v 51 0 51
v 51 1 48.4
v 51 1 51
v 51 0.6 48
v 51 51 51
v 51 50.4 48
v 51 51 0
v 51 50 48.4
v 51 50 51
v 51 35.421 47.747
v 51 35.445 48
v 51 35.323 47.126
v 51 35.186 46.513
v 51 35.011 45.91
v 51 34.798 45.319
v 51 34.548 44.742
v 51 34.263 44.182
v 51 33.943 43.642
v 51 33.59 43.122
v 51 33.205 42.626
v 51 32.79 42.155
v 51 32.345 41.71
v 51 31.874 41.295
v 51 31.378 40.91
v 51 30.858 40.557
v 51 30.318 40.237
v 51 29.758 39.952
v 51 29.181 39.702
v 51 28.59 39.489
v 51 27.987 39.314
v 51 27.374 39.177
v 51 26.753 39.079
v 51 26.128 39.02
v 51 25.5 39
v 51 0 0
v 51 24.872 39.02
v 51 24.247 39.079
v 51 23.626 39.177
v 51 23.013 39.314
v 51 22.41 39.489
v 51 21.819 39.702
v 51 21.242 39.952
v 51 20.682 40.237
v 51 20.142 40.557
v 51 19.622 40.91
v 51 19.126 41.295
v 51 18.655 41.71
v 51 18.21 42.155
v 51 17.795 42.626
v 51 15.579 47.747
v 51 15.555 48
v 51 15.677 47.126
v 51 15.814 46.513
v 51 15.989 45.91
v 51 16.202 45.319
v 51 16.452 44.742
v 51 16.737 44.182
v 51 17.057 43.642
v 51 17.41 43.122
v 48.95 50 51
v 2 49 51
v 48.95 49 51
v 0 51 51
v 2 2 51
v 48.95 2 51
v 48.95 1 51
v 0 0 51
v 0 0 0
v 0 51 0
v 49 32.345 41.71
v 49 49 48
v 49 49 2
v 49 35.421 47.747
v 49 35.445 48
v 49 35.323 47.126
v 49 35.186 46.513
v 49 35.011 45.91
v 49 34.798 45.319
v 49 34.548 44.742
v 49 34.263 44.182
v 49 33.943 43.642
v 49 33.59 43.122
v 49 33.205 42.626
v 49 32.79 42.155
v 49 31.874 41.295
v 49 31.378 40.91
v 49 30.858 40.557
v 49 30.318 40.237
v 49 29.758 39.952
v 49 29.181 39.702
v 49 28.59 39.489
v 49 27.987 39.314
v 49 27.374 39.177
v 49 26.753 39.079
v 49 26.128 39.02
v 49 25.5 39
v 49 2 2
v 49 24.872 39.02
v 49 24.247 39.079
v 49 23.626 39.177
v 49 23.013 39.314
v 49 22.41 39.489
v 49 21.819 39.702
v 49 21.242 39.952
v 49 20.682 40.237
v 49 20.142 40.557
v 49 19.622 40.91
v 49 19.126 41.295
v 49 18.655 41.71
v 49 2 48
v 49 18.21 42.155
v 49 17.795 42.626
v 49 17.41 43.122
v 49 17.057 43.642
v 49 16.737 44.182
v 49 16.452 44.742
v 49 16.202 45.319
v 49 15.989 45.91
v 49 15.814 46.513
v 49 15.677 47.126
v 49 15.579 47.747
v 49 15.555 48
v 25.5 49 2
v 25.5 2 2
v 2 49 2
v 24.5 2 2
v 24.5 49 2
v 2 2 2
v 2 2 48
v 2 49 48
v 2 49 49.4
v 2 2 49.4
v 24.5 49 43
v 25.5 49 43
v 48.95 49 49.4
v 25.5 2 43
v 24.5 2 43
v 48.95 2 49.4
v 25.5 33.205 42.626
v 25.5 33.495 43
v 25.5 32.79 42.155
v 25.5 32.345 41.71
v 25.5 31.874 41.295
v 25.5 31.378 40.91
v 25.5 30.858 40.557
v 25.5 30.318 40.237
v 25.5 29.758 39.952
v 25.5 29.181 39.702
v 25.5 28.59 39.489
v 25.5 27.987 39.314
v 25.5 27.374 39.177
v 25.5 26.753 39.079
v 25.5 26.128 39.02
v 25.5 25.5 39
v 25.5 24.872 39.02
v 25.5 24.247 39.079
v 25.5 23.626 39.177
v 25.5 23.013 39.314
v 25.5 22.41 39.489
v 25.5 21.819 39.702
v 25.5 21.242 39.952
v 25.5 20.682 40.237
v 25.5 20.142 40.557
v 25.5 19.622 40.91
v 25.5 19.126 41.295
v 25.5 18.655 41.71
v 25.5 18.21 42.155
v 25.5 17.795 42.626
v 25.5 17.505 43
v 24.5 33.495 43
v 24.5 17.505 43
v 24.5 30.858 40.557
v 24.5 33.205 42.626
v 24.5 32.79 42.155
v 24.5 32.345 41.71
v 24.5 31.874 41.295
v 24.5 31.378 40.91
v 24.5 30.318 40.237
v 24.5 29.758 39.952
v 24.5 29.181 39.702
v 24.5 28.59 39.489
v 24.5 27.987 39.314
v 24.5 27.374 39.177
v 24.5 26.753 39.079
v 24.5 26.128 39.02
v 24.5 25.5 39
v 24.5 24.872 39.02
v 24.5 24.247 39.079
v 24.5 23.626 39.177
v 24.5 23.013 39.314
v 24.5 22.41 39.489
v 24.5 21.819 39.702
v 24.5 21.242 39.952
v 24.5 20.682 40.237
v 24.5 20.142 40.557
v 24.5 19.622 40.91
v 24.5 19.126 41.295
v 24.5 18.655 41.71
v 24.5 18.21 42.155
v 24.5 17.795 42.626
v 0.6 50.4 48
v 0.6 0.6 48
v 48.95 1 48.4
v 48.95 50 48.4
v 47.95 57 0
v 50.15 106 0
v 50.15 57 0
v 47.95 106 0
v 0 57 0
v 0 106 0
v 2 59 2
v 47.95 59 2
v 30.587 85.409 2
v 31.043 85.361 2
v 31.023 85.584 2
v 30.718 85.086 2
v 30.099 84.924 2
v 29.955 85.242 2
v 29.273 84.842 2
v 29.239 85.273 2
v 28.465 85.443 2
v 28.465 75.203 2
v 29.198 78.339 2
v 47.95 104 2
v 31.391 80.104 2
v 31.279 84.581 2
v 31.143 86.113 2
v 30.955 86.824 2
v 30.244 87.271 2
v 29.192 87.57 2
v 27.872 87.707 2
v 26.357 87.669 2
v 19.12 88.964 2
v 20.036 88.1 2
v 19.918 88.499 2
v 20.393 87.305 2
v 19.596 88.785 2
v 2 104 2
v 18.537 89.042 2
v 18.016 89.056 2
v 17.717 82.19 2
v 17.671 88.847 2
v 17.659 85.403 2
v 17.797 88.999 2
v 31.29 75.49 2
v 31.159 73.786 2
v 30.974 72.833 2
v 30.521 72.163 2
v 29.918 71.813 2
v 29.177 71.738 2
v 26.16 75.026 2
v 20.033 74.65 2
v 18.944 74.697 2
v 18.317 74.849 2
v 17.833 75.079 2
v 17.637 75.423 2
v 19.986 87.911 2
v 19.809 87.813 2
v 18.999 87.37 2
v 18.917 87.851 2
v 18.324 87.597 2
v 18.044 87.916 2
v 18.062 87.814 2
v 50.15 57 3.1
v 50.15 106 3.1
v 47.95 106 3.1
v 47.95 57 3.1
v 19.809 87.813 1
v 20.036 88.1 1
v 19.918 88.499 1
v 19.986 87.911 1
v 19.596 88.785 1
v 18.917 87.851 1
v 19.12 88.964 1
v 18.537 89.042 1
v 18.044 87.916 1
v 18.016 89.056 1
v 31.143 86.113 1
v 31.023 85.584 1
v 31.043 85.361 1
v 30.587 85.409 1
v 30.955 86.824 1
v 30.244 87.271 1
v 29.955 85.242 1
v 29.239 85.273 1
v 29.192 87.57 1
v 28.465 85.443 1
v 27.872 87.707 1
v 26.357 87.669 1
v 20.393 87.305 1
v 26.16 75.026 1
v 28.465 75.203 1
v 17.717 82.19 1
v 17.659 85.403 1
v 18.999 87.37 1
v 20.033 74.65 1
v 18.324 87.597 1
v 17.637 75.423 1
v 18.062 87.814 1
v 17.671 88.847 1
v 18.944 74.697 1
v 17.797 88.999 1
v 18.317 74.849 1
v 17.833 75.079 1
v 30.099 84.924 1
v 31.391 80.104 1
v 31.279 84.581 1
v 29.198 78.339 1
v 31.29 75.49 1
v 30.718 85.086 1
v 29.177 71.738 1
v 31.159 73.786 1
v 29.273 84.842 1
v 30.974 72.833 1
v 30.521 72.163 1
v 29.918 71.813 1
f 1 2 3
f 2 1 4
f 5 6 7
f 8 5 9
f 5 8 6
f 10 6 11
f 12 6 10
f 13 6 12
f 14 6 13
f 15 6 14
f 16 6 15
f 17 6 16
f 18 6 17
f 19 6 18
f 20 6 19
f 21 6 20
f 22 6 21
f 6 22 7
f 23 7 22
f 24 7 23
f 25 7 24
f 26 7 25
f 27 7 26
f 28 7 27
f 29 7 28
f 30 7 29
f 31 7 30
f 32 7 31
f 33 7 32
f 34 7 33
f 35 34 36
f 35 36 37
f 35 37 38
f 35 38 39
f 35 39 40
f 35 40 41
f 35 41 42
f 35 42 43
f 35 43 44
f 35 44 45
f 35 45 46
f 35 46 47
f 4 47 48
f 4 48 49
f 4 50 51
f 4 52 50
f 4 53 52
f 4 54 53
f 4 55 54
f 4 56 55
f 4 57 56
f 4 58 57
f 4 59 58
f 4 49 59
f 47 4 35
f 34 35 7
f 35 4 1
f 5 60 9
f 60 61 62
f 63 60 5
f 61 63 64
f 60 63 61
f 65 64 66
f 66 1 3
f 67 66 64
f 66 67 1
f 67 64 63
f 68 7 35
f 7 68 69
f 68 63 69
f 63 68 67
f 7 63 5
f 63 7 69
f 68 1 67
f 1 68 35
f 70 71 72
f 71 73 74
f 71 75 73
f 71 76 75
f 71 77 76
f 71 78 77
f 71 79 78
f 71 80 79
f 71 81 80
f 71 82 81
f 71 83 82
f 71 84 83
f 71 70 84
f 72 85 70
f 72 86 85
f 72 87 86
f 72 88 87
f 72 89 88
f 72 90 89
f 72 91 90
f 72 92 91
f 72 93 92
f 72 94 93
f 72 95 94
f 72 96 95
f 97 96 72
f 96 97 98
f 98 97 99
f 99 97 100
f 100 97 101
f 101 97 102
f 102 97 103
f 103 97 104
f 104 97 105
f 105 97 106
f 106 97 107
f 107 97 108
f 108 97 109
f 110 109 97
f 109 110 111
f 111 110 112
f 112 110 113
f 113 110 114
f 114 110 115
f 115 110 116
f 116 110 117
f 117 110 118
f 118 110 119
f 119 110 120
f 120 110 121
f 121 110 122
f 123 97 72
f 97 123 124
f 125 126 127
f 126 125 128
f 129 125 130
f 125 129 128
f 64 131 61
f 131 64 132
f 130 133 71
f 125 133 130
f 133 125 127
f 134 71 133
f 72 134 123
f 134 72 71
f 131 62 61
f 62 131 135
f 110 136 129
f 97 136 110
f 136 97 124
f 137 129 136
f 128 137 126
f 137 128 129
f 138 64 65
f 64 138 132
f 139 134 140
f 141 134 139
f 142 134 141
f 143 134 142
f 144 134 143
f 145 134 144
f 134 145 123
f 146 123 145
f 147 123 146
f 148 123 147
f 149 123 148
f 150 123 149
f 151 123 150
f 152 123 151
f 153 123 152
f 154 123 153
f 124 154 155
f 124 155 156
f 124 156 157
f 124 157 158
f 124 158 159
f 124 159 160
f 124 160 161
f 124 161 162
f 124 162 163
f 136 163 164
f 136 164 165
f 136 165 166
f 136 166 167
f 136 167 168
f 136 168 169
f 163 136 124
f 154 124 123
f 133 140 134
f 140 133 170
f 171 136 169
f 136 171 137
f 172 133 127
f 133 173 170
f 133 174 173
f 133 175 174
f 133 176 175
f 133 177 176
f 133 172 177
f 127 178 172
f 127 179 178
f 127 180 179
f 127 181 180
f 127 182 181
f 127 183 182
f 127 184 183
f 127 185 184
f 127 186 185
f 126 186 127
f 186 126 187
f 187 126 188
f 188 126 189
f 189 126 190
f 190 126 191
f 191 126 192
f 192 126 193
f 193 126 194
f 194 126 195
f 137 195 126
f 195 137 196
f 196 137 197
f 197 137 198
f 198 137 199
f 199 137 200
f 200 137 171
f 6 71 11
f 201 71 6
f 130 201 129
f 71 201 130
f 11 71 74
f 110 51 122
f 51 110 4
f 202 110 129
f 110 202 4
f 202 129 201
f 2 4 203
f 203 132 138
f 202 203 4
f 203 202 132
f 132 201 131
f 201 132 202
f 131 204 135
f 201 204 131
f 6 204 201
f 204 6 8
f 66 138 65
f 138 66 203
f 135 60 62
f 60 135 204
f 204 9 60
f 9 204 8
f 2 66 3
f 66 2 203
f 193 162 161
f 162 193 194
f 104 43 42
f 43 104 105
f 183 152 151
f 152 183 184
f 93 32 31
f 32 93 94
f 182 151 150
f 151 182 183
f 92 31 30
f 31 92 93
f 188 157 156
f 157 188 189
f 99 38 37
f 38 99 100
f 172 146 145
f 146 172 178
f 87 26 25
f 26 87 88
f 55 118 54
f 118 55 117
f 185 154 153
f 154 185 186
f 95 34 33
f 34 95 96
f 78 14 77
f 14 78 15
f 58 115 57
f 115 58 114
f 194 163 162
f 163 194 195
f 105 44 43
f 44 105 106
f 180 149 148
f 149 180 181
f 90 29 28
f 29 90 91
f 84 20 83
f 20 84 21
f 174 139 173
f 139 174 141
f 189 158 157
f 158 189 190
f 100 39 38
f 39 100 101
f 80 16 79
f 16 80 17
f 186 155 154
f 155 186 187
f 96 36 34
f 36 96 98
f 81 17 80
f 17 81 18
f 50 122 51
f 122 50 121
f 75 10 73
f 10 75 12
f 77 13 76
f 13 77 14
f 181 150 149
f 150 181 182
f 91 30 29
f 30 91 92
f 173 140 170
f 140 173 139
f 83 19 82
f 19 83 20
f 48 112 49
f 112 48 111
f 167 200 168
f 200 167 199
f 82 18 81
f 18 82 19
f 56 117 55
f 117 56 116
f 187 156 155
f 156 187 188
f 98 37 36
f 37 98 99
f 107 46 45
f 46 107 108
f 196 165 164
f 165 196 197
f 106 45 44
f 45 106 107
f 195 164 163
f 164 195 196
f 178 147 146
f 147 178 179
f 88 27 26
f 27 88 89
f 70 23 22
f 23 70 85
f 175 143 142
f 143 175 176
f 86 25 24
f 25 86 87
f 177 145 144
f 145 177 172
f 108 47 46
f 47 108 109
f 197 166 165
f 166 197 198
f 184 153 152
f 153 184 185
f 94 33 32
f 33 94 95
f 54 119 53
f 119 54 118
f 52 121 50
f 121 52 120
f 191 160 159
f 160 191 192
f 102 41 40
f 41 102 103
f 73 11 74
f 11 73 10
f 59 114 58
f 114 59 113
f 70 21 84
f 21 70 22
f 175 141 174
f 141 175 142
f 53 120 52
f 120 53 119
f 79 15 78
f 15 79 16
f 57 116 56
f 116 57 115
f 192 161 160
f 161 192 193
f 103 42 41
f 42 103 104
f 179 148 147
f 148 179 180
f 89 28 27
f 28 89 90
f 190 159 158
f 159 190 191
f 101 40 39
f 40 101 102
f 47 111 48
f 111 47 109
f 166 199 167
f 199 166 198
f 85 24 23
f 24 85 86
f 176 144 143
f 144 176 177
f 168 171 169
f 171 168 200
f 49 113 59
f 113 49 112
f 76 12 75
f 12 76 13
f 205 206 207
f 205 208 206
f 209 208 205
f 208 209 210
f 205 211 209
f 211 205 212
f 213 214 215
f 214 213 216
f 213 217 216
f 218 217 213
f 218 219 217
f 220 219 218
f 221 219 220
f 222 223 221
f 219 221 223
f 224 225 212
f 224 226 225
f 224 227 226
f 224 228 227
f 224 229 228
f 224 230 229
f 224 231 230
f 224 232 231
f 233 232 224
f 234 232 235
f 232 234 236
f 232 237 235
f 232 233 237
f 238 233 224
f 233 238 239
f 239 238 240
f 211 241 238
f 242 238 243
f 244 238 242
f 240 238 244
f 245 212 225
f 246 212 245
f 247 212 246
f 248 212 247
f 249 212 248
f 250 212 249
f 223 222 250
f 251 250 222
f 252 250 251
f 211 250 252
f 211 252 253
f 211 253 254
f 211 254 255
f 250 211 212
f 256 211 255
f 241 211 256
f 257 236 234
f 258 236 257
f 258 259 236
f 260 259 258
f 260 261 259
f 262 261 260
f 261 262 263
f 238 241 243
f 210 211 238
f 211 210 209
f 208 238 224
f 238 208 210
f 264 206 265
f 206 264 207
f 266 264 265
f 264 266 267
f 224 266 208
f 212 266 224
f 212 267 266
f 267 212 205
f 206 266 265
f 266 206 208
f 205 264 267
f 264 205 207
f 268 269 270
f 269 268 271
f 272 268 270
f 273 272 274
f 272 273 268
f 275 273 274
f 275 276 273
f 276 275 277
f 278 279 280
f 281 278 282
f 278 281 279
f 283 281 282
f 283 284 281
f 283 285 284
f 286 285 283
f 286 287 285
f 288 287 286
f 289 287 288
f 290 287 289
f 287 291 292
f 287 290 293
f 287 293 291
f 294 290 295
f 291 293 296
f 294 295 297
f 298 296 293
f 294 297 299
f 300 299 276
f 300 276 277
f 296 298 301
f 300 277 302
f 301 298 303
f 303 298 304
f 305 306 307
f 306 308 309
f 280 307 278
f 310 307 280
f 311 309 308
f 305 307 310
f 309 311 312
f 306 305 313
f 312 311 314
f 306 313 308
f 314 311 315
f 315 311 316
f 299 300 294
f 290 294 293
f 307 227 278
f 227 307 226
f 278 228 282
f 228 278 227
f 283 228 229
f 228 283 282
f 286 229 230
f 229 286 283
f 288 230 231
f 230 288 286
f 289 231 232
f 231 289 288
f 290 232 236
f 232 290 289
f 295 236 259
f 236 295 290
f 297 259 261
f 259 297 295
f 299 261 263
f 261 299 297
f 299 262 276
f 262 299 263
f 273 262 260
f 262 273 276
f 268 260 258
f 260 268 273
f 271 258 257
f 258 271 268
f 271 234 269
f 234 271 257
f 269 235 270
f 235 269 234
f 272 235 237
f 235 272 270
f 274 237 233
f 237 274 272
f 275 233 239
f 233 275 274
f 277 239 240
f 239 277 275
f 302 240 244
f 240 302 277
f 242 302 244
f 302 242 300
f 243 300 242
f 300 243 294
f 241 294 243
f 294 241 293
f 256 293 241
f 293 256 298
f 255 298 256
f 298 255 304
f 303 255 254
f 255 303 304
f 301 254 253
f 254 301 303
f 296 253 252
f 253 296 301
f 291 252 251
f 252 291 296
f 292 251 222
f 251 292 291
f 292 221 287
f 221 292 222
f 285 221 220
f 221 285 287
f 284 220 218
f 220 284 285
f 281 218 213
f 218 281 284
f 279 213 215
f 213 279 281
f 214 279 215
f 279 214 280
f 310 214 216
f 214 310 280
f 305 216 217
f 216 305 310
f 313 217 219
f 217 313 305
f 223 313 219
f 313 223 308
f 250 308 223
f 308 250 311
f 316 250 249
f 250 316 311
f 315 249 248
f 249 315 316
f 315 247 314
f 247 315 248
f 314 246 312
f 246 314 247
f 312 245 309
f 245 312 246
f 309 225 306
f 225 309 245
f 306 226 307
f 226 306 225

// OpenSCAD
// file: carcassonne_box.scad
/**
 * @file carcassonne_box.scad
 * @author Conlan Wesson
 * Template for Carcossonne boxes.
 * @copyright Creative Commons Attribution-NonCommercial-ShareAlike 4.0
 */

mm = 1;
cm = 10*mm;

width = 47*mm;
thick = 2.5*mm;
wall = 2*mm;

/**
 * Lid for box.
 * @param count Number of cards.
 * @param columns Number of columns.
 * @param icon Path to icon DXF file.
 * @param rot Icon rotation in degrees.
 * @param mult Icon scale.
 * @param xoff X-offset of icon from center.
 * @param yoff Y-offset of icon from center.
 */
module carcassonne_lid(count, columns=1, icon=false, rot=0, mult=1, xoff=0, yoff=0, g=0){
	length = (thick * count) + ((width/2) - ((thick * count) % (width/2)));
	w = length+(1.5*wall)+.1;
	l = (width*columns)+wall;
	h = wall;
	d = 2;

	CubePoints = [
		[ 0-g, 0-g,   0 ],  //0
		[ w+g, 0-g,   0 ],  //1
		[ w+g, l+g,   0 ],  //2
		[ 0-g, l+g,   0 ],  //3
		[   d,   d, h+g ],  //4
		[   w,   d, h+g ],  //5
		[   w, l-d, h+g ],  //6
		[   d, l-d, h+g ]   //7
	];
	
	CubeFaces = [
		[0,1,2,3],  // bottom
		[4,5,1,0],  // front
		[7,6,5,4],  // top
		[5,6,2,1],  // right
		[6,7,3,2],  // back
		[7,4,0,3]   // left
	];
	
	
	difference(){
		union(){
			polyhedron( CubePoints, CubeFaces );
			translate([w-wall-.15,0,0]) cube([wall+.2,l, (1.5*wall)+.1]);
		}
		if(icon){
			translate([w/2+xoff,l/3+yoff,h-(wall/2)]){
				linear_extrude(height=(wall)+.1){
					rotate(rot) scale(mult) import(icon);
				}
			}
		}
	}
}

/**
 * Carcassonne card box.
 * @param count Number of cards.
 * @param dividers Array of divider positions.
 * @param columns Number of columns.
 */
module carcassonne_box(count, dividers=[], columns=1){
	length = (thick * count) + ((width/2) - ((thick * count) % (width/2)));
	difference(){
		union(){
			difference(){
				// Outer walls
				cube([length+(2*wall), (width*columns)+(2*wall), width+(2*wall)]);
				// Cavity
				translate([wall, wall, wall]){
					cube([length, width*columns, (width+wall)+.1]);
				}
			}
			// Dividers
			for(col = [0:columns-1]){
				for(div = dividers[col]){
					translate([(div*(width/2))+(wall/2), width*col+wall, 0]) cube([wall/2, width, width-(2*wall)]);
				}
				if(col > 0){
					translate([0, width*col+(wall/2), 0]) cube([length+(2*wall), wall/2, width-(2*wall)]);
				}
			}
		}
		union(){
			// Notch
			for(col = [0:columns-1]){
				translate([wall, wall+(width*col), wall]){
					translate([0, width/2, width])
					rotate([0, 90, 0]){
						cylinder(r=10, h=length+(2*wall), $fn=100);
					}
				}
			}
			// Track
			translate([wall/2,wall/2,width+wall/2]) carcassonne_lid(count, columns, g=0.4);
		}
	}
}
// main file
/**
 * @file messengers.scad
 * @author Conlan Wesson
 * The Messengers Carcossonne box.
 * @copyright Creative Commons Attribution-NonCommercial-ShareAlike 4.0
 */

include <carcassonne_box.scad>

count = 16;
dividers = [[1]];
columns = 1;

carcassonne_box(count, dividers, columns);
translate([0,width*columns+10,0]) carcassonne_lid(count, columns, icon="messengers.dxf", rot=90, mult=0.7, xoff=10, yoff=-4);
